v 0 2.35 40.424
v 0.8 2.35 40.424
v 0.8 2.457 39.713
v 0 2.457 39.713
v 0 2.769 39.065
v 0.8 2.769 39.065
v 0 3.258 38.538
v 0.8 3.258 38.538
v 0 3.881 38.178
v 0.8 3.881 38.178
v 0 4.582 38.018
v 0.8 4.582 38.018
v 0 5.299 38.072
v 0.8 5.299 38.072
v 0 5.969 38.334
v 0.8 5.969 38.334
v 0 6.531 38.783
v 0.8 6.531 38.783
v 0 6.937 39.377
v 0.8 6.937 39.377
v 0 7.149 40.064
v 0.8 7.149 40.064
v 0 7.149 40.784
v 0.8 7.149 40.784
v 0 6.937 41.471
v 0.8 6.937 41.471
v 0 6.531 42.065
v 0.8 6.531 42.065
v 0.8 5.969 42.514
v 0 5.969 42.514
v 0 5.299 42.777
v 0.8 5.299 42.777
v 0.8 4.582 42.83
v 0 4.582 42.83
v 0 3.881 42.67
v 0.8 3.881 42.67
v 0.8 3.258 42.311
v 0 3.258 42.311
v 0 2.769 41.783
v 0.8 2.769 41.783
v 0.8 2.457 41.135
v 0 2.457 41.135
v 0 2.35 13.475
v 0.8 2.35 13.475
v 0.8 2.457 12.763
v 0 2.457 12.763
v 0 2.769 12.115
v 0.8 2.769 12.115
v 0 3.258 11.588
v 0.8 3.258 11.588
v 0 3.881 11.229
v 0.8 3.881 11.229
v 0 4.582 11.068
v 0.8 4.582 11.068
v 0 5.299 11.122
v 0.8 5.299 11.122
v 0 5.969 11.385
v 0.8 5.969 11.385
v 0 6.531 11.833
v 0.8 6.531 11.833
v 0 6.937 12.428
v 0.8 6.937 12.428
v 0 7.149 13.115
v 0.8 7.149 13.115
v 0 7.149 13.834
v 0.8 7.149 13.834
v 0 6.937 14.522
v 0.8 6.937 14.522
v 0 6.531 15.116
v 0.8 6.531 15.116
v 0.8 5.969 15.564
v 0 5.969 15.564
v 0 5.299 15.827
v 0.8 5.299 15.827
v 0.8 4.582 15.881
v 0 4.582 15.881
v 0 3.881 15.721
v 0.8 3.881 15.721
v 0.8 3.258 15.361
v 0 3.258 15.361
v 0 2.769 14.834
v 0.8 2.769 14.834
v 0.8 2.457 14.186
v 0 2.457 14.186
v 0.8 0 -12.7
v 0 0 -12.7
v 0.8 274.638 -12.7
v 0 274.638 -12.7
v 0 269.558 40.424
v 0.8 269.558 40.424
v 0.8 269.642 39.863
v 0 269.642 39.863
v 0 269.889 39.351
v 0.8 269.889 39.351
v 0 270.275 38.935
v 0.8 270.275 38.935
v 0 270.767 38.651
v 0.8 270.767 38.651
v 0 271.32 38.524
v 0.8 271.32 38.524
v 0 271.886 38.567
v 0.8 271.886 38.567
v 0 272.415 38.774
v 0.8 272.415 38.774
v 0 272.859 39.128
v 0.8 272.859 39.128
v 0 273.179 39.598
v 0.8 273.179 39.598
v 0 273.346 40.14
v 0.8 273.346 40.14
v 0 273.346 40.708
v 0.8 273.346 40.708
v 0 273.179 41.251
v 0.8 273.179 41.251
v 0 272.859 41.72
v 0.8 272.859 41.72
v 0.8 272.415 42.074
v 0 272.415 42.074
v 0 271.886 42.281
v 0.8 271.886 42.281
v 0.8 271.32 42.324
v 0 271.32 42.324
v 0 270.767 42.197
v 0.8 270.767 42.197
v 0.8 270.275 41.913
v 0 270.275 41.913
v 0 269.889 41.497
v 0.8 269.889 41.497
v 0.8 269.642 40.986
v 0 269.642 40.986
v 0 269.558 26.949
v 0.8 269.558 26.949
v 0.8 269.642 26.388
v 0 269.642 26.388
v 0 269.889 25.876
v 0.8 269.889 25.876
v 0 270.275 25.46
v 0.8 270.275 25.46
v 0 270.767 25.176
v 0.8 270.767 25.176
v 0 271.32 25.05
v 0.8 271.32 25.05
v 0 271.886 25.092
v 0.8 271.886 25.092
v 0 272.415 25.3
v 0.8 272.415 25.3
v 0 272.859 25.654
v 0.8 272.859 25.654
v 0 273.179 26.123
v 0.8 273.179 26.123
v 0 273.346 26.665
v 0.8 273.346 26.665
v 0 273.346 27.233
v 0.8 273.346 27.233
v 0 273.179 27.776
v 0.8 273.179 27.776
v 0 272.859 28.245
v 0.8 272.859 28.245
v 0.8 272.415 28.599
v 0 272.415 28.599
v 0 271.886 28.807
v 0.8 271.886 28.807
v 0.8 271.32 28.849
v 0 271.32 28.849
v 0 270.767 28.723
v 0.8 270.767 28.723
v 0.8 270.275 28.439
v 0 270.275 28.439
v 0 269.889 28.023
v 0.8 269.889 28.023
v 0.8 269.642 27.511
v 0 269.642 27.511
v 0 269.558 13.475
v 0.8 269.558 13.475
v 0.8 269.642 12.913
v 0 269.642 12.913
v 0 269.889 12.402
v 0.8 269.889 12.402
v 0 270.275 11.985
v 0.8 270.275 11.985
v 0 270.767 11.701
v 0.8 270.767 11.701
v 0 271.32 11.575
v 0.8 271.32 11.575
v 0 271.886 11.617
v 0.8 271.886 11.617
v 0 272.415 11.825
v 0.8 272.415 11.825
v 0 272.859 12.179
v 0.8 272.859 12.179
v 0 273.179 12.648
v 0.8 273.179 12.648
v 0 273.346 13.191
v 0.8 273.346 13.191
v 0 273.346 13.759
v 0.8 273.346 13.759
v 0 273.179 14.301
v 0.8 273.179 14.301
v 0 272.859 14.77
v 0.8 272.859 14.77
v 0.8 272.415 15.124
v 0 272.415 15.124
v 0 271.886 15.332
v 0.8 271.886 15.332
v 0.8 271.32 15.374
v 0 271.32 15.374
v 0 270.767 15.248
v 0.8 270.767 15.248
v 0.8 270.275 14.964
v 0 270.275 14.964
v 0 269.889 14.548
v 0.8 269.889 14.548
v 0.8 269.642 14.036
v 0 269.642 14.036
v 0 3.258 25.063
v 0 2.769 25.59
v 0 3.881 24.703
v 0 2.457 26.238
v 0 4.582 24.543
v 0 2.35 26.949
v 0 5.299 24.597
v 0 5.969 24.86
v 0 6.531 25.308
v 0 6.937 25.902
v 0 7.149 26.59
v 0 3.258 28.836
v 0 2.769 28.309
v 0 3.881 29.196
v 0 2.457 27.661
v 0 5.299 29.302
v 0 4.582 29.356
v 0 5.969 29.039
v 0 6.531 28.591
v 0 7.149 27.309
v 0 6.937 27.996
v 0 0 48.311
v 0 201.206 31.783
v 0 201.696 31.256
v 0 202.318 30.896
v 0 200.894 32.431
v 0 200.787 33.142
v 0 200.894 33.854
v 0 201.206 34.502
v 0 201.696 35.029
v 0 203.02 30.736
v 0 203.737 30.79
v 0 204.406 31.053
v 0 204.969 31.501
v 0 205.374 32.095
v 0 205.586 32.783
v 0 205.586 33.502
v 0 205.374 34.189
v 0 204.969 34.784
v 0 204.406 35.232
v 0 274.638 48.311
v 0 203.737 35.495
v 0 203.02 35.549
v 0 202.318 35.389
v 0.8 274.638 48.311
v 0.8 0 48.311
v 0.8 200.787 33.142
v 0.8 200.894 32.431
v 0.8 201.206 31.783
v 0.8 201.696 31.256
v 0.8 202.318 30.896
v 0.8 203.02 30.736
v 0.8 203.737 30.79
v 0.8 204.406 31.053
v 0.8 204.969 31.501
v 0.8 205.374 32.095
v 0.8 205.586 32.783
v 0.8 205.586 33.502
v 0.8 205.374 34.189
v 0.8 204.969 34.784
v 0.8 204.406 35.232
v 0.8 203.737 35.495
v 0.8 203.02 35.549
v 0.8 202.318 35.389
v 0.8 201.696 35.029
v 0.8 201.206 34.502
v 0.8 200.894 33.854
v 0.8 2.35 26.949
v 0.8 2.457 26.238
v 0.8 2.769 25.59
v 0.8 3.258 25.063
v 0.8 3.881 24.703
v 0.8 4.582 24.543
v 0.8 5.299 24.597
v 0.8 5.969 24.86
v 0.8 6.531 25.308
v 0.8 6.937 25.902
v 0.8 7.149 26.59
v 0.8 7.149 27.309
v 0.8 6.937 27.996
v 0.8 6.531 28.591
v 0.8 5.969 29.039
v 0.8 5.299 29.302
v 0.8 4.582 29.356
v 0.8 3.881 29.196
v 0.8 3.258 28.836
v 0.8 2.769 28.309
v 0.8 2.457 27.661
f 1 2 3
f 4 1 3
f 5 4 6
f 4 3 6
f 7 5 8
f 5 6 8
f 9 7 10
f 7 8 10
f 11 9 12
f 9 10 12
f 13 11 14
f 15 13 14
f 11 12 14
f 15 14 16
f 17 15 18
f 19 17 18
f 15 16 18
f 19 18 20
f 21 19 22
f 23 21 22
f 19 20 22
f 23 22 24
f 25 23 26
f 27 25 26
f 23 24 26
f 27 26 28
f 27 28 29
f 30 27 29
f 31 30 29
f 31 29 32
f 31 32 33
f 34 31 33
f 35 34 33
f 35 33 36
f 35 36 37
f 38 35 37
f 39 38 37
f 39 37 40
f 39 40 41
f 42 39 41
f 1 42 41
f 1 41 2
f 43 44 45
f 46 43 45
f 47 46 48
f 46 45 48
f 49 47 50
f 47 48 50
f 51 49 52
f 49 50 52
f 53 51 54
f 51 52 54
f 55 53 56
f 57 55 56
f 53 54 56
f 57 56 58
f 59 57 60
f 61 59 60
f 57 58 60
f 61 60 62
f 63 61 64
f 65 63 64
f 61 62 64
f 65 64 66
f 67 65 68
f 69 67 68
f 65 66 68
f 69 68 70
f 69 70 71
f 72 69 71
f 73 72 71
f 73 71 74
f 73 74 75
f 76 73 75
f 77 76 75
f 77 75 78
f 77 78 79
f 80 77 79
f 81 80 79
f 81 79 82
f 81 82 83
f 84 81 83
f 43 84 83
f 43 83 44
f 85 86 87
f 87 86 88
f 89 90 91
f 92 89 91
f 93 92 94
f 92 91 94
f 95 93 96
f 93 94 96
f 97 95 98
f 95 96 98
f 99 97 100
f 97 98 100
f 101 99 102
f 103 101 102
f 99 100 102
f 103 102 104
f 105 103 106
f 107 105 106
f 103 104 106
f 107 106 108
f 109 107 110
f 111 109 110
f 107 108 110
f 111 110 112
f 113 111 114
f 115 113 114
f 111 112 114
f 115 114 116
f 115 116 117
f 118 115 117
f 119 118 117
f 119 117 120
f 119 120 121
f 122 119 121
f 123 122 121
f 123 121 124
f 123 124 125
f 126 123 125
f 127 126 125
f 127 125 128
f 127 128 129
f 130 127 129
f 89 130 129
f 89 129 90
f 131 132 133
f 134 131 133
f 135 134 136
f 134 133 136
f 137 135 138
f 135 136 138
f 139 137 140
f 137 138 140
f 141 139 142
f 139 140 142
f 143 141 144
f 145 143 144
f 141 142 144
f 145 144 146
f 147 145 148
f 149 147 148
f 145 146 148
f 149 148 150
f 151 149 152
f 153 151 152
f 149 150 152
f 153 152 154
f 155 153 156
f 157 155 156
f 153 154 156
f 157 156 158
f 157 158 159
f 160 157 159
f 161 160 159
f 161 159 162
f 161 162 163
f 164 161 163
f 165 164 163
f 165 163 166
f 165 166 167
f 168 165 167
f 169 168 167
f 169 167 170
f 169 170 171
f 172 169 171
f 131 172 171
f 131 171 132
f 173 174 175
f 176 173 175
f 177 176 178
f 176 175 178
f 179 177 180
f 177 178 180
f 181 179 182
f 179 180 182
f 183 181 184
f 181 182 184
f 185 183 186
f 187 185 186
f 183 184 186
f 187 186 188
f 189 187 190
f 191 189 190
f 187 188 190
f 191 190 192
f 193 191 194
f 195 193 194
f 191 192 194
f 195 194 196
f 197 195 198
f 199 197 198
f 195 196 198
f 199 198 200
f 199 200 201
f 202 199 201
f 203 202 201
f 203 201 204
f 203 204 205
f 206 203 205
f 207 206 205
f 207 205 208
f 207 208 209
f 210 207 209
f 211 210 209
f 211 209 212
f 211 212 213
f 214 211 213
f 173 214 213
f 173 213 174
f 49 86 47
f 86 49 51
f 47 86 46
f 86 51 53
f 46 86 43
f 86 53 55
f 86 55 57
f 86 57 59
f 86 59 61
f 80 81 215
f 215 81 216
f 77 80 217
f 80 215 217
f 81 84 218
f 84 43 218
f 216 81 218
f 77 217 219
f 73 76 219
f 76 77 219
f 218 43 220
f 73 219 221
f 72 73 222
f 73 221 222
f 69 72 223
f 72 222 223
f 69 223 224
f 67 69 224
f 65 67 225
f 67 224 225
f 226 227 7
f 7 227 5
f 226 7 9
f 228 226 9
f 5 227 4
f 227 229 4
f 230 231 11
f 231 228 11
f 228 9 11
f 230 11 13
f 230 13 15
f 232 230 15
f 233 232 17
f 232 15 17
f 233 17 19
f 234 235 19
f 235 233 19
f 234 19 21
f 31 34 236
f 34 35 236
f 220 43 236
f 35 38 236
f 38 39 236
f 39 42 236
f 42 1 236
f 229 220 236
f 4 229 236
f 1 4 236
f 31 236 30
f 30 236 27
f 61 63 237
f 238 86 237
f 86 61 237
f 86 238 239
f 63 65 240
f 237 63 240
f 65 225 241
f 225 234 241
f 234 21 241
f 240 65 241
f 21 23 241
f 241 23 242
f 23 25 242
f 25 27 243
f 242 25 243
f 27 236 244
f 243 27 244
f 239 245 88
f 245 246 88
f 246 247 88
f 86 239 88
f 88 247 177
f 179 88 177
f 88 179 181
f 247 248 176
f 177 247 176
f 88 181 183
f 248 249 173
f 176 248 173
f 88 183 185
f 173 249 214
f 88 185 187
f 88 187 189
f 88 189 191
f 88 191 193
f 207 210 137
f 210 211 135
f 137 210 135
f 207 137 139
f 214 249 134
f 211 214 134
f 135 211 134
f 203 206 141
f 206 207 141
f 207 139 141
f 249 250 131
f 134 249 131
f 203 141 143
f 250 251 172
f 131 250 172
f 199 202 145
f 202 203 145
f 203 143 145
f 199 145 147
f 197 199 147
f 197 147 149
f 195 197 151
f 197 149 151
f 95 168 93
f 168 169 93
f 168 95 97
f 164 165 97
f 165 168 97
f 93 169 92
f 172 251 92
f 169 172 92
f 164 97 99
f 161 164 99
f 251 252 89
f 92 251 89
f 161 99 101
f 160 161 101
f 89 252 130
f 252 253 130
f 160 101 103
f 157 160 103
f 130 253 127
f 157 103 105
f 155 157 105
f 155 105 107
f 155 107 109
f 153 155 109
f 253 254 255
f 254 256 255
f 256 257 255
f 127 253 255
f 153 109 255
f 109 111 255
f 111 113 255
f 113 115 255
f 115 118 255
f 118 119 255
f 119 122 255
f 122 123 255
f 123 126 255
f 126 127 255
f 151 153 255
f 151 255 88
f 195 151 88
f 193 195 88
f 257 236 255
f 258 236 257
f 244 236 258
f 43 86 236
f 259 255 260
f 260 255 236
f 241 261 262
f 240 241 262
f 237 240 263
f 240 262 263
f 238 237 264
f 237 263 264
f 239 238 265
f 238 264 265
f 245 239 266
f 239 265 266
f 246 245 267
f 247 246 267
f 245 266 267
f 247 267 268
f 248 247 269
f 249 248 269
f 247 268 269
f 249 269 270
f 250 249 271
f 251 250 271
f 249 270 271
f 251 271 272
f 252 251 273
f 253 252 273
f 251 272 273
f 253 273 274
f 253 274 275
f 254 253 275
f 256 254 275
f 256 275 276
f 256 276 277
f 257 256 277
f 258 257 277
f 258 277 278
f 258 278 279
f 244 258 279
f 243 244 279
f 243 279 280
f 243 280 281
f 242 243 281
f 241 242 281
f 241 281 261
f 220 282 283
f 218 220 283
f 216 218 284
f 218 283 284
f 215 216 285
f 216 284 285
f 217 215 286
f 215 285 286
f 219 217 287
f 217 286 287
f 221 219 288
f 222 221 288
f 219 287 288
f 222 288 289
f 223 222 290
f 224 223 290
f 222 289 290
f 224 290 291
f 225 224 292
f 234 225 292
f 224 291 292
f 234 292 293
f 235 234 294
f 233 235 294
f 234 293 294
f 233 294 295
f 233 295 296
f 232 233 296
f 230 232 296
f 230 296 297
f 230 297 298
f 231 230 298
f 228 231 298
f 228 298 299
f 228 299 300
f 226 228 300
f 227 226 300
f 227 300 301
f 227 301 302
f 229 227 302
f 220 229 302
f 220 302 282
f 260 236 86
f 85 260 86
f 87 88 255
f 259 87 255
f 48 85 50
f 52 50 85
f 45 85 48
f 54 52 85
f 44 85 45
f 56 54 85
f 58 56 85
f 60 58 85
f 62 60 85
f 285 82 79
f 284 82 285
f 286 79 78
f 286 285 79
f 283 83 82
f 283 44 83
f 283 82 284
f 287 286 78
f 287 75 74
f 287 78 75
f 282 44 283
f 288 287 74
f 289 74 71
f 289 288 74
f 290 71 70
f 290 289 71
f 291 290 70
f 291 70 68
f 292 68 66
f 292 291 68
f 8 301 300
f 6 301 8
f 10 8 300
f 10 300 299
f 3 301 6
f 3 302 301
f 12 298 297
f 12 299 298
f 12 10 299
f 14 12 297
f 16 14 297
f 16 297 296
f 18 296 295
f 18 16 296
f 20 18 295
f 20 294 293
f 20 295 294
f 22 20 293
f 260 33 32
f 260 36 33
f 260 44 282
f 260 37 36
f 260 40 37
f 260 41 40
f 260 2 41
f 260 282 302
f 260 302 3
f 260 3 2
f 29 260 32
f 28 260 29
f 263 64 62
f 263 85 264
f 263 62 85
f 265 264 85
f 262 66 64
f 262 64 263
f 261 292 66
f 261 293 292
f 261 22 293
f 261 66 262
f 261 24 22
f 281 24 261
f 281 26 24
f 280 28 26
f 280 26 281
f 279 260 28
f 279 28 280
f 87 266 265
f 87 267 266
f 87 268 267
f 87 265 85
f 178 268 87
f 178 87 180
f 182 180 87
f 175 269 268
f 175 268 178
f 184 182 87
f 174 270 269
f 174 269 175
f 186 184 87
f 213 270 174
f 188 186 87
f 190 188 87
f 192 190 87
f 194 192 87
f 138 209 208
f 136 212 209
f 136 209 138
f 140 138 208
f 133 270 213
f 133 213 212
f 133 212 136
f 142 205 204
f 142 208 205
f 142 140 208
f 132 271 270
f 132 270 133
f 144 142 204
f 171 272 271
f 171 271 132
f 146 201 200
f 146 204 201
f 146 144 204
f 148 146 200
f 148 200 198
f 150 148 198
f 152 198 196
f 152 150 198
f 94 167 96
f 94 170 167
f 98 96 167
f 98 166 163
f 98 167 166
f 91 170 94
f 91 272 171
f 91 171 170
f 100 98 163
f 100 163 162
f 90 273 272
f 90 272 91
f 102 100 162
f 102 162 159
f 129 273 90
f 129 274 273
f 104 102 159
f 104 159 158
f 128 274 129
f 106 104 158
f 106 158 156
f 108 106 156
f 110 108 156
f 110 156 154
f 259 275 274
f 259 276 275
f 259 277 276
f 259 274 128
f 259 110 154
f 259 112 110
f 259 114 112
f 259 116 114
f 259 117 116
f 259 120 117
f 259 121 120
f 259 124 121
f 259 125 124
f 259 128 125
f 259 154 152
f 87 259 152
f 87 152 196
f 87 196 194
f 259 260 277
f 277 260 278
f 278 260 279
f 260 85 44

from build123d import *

# Parameters (mm, degrees)
F1_DEPTH = 0.8001
F2_D     = 4.826
F3_D     = 3.81


with BuildPart() as f1:
    # F0 (on Right) → F1 (new body)
    with BuildSketch(Plane.YZ):
        Polygon((274.6375, -12.7), (274.6375, 0), (274.6375, 48.3108), (0, 48.3108), (0, 0), (0, -12.7), align=None)
    extrude(amount=F1_DEPTH)

    # F2 (through all)
    with Locations(Plane(origin=(0, 0, 0), x_dir=(0, 1, 0), z_dir=(-1, 0, 0))):
        with Locations((4.7625, -40.4241), (4.7625, -26.9494), (4.7625, -13.4747), (203.2, -33.1423059973)):
            Hole(F2_D / 2)

    # F3 (through all)
    with Locations(Plane(origin=(0, 0, 0), x_dir=(0, 1, 0), z_dir=(-1, 0, 0))):
        with Locations((271.4625, -40.4241), (271.4625, -26.9494), (271.4625, -13.4747)):
            Hole(F3_D / 2)


solid = f1.part
